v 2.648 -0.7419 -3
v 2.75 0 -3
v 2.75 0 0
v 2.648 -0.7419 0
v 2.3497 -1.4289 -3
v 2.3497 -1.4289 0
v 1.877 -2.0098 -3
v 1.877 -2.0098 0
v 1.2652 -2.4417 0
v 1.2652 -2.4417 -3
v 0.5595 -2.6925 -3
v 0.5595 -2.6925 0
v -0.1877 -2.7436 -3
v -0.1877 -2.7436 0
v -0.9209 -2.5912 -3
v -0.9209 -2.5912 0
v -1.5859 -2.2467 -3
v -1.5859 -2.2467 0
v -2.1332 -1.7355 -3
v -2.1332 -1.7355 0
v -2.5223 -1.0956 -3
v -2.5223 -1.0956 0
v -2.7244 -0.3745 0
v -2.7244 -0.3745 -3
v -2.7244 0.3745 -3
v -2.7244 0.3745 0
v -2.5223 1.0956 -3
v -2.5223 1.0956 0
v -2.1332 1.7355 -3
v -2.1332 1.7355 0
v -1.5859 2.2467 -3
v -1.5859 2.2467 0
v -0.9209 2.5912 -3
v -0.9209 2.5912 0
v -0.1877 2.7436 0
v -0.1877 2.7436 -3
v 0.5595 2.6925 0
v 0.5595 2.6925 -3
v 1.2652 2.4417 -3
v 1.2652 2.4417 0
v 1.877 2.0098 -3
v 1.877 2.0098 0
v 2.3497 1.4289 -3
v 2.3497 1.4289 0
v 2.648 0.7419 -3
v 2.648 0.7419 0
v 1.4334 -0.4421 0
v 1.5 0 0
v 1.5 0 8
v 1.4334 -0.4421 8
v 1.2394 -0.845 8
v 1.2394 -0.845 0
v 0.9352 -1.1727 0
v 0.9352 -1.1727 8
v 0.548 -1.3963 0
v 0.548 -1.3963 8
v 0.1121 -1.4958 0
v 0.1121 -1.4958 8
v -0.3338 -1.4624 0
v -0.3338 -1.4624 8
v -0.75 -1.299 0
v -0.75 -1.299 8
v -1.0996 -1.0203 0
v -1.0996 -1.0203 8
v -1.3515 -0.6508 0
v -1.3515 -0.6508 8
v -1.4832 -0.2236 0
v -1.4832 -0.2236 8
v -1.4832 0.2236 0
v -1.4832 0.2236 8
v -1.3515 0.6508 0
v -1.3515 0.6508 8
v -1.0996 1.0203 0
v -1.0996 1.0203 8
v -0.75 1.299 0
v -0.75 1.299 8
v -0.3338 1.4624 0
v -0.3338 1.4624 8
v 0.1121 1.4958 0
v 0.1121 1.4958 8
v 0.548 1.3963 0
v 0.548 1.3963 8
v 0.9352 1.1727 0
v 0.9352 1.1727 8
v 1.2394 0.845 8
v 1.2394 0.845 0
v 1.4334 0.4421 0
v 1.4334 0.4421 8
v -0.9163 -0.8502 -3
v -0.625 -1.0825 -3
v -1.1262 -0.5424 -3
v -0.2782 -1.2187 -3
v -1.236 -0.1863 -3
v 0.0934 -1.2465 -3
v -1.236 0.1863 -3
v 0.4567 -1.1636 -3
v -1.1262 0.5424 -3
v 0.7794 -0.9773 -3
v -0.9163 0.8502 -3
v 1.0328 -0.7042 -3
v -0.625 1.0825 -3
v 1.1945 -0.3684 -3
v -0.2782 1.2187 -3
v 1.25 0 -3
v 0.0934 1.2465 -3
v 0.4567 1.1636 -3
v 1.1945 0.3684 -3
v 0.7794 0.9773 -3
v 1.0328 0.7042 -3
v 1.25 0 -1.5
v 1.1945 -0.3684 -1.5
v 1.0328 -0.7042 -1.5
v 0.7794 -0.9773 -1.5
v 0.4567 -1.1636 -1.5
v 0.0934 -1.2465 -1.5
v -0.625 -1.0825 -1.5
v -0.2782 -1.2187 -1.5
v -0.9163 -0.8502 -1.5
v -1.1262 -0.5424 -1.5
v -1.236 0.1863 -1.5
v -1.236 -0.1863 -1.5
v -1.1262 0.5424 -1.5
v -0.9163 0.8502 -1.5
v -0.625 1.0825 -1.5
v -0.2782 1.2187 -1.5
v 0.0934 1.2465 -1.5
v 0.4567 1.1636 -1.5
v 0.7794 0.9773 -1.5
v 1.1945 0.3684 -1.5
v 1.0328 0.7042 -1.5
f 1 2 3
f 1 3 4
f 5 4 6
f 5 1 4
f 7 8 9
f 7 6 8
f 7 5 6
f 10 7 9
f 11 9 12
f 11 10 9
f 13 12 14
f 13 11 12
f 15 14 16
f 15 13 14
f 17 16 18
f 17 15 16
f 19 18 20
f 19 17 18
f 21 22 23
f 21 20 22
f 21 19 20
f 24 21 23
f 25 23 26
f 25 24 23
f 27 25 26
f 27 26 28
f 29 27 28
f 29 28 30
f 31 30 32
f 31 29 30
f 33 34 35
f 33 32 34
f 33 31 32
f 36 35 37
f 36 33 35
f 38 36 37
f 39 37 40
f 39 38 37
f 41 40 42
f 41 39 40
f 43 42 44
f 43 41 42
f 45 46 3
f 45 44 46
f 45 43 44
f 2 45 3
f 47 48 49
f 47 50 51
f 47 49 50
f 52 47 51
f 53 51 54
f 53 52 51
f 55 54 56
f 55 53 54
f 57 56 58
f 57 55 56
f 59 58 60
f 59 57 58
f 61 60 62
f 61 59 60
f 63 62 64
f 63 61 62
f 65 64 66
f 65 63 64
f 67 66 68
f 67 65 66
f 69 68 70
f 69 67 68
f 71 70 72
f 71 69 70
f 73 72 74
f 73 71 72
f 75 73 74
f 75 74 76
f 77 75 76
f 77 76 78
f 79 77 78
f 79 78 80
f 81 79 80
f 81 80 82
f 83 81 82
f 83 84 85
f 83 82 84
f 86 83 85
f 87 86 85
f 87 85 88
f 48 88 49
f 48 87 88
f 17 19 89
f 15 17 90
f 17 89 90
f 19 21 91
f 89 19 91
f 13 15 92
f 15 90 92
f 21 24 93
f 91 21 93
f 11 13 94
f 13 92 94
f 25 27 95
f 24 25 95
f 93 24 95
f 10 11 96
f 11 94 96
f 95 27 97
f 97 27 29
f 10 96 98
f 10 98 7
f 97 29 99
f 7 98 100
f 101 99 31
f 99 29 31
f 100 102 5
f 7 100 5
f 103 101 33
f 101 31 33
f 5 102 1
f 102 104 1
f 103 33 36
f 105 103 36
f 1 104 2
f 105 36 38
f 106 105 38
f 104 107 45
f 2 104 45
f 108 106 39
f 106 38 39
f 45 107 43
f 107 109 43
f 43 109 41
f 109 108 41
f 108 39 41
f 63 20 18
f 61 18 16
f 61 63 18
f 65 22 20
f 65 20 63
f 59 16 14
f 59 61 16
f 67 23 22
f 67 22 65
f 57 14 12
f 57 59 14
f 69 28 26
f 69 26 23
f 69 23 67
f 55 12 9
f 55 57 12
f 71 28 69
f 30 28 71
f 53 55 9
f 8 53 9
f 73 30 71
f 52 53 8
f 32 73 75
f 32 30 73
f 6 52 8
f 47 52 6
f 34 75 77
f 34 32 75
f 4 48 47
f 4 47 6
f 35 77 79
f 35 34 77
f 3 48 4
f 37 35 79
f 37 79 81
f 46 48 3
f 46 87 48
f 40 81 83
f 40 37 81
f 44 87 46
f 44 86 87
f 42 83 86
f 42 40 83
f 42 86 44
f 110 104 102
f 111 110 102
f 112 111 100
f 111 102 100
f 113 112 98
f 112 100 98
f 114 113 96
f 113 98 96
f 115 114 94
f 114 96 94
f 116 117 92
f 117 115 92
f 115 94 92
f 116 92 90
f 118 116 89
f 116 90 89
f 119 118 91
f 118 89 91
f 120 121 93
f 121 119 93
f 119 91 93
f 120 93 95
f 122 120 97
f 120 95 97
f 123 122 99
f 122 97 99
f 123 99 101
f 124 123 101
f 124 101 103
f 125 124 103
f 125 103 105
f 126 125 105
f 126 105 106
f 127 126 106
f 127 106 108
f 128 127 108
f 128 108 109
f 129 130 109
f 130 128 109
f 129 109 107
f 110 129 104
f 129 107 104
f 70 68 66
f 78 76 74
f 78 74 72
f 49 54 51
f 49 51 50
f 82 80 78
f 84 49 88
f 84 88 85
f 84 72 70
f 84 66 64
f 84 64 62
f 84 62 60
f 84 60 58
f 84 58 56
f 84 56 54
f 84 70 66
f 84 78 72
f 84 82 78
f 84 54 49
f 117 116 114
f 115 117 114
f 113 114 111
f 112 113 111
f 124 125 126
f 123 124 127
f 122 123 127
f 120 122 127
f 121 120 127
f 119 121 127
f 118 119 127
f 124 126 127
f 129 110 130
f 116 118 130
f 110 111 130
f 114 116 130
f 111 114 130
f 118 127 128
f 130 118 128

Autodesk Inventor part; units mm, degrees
ref_plane "Work Plane1" through (0, 0, -3) normal (0, 0, 1) x (1, 0, 0)
sketch "Sketch1" plane through (0, 0, -3) normal (0, 0, 1) x (1, 0, 0)
  circle A0 centre (0, 0) radius 2.75
extrude "M3_Head_Envelope" add sketch "Sketch1" along normal blind 3
sketch "Sketch2" plane through (0, 0, 0) normal (0, 0, 1) x (1, 0, 0)
  circle A0 centre (0, 0) radius 1.5
extrude "M3_Clearance_Grip" add sketch "Sketch2" along normal blind 4
ref_plane "Work Plane2" through (0, 0, 4) normal (0, 0, 1) x (1, 0, 0)
sketch "Sketch3" plane through (0, 0, 4) normal (0, 0, 1) x (1, 0, 0)
  circle A0 centre (0, 0) radius 1.5
extrude "Thread_Core_No_Helix" add sketch "Sketch3" along normal blind 4
ref_plane "Work Plane3" through (0, 0, -3) normal (0, 0, 1) x (1, 0, 0)
sketch "Sketch4" plane through (0, 0, -3) normal (0, 0, 1) x (1, 0, 0)
  circle A0 centre (0, 0) radius 1.25
extrude "Extrusion4" cut sketch "Sketch4" along normal blind 1.5
properties part number "Rod_M3x8_Simplified"
